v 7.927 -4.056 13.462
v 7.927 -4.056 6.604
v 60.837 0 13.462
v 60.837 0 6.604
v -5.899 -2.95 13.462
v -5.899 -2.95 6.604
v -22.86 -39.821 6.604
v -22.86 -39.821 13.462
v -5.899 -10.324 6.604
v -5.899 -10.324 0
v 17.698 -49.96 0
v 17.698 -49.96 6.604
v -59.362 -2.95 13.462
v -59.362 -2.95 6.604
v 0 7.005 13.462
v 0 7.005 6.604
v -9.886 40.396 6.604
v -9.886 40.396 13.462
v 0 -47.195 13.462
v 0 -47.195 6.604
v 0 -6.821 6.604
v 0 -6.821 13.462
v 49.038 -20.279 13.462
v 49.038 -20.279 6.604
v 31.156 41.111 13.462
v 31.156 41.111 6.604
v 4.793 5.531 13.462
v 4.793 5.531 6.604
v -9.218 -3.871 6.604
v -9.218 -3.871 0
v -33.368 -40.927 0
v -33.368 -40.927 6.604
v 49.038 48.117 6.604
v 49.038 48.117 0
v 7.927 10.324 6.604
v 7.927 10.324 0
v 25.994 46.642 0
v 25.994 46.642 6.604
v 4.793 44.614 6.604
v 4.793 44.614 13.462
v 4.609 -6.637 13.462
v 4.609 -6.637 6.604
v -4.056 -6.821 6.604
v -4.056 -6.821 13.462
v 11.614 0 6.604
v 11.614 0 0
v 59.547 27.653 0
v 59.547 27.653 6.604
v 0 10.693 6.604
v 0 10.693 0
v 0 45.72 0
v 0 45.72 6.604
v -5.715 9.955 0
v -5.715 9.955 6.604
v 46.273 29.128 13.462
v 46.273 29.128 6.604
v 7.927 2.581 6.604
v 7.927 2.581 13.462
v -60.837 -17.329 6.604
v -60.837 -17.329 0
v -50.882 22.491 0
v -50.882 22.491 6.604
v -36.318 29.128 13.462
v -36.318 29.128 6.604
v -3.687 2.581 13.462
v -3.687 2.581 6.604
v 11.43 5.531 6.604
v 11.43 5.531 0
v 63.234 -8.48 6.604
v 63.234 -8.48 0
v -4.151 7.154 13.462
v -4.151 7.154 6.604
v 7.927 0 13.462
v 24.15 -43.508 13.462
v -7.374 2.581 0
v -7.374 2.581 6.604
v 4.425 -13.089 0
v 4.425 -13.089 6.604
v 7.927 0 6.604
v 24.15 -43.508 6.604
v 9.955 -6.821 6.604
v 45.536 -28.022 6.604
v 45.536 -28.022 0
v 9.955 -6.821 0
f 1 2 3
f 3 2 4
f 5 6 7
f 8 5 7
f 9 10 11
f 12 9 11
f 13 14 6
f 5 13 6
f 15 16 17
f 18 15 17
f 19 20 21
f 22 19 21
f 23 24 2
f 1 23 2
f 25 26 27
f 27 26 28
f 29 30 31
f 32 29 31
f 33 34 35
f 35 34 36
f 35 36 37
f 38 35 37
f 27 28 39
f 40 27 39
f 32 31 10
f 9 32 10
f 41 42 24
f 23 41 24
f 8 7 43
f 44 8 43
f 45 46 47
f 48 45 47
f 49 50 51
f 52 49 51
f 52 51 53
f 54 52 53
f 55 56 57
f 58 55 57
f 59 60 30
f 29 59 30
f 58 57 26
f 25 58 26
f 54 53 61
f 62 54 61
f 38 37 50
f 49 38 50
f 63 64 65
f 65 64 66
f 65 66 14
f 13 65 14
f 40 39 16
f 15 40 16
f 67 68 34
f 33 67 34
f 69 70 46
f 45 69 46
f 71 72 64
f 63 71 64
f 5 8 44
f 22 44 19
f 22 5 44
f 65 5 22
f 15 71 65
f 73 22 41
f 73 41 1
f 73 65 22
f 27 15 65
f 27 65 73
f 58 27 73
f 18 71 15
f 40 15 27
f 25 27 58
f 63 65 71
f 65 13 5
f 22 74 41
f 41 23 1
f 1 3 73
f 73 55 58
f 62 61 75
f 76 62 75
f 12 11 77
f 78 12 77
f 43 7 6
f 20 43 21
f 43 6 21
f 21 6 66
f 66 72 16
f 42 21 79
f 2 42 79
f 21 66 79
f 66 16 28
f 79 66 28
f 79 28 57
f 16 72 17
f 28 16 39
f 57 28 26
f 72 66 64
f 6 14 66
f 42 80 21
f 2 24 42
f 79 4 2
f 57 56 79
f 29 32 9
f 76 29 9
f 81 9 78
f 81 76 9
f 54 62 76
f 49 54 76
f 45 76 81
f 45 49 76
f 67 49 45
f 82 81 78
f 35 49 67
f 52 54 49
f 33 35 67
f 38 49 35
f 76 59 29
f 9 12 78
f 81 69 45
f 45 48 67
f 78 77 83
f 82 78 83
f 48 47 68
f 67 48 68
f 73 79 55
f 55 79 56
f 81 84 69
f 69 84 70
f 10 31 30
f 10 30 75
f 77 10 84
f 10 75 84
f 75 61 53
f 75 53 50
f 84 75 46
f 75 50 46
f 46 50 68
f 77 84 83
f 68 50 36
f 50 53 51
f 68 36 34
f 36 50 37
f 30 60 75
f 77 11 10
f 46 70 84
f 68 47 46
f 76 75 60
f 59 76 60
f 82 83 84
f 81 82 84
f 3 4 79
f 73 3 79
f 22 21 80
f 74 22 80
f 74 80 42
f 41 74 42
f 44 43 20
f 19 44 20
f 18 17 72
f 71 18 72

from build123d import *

# Parameters (mm, degrees)
F1_DEPTH = 6.604
F3_DEPTH = 6.858


with BuildPart() as f1:
    # F0 (on Top) → F1 (new body)
    with BuildSketch(Plane.XY):
        Polygon((49.038388, 48.116613), (7.927259, 10.323871), (25.994034, 46.641771), (0, 10.692582), (0, 45.720004), (-5.715, 9.955161), (-50.881937, 22.491291), (-7.374194, 2.580968), (-60.837097, -17.329356), (-9.217742, -3.871452), (-33.368226, -40.926777), (-5.899355, -10.323871), (17.698064, -49.960162), (4.424516, -13.089194), (45.535646, -28.021937), (9.95516, -6.821129), (63.233711, -8.480323), (11.614355, 0), (59.546616, 27.653227), (11.430001, 5.530645), align=None)
    extrude(amount=F1_DEPTH)


with BuildPart() as f3:
    # F2 (on face) → F3 (new body)
    with BuildSketch(Plane.XY.offset(6.604)):
        Polygon((4.793225, 44.613868), (0, 7.005484), (-9.886474, 40.395804), (-4.150697, 7.154371), (-36.317904, 29.128065), (-3.687096, 2.580968), (-59.362259, -2.949677), (-5.899355, -2.949677), (-22.86, -39.820645), (-4.055807, -6.821129), (0, -47.194839), (0, -6.821129), (24.150483, -43.50774), (4.60887, -6.636775), (49.038388, -20.279033), (7.927259, -4.055806), (60.837097, 0), (7.927259, 0), (46.273064, 29.128065), (7.927259, 2.580968), (31.155966, 41.11113), (4.793225, 5.530645), align=None)
    extrude(amount=F3_DEPTH)


solid = Compound([f1.part, f3.part])
